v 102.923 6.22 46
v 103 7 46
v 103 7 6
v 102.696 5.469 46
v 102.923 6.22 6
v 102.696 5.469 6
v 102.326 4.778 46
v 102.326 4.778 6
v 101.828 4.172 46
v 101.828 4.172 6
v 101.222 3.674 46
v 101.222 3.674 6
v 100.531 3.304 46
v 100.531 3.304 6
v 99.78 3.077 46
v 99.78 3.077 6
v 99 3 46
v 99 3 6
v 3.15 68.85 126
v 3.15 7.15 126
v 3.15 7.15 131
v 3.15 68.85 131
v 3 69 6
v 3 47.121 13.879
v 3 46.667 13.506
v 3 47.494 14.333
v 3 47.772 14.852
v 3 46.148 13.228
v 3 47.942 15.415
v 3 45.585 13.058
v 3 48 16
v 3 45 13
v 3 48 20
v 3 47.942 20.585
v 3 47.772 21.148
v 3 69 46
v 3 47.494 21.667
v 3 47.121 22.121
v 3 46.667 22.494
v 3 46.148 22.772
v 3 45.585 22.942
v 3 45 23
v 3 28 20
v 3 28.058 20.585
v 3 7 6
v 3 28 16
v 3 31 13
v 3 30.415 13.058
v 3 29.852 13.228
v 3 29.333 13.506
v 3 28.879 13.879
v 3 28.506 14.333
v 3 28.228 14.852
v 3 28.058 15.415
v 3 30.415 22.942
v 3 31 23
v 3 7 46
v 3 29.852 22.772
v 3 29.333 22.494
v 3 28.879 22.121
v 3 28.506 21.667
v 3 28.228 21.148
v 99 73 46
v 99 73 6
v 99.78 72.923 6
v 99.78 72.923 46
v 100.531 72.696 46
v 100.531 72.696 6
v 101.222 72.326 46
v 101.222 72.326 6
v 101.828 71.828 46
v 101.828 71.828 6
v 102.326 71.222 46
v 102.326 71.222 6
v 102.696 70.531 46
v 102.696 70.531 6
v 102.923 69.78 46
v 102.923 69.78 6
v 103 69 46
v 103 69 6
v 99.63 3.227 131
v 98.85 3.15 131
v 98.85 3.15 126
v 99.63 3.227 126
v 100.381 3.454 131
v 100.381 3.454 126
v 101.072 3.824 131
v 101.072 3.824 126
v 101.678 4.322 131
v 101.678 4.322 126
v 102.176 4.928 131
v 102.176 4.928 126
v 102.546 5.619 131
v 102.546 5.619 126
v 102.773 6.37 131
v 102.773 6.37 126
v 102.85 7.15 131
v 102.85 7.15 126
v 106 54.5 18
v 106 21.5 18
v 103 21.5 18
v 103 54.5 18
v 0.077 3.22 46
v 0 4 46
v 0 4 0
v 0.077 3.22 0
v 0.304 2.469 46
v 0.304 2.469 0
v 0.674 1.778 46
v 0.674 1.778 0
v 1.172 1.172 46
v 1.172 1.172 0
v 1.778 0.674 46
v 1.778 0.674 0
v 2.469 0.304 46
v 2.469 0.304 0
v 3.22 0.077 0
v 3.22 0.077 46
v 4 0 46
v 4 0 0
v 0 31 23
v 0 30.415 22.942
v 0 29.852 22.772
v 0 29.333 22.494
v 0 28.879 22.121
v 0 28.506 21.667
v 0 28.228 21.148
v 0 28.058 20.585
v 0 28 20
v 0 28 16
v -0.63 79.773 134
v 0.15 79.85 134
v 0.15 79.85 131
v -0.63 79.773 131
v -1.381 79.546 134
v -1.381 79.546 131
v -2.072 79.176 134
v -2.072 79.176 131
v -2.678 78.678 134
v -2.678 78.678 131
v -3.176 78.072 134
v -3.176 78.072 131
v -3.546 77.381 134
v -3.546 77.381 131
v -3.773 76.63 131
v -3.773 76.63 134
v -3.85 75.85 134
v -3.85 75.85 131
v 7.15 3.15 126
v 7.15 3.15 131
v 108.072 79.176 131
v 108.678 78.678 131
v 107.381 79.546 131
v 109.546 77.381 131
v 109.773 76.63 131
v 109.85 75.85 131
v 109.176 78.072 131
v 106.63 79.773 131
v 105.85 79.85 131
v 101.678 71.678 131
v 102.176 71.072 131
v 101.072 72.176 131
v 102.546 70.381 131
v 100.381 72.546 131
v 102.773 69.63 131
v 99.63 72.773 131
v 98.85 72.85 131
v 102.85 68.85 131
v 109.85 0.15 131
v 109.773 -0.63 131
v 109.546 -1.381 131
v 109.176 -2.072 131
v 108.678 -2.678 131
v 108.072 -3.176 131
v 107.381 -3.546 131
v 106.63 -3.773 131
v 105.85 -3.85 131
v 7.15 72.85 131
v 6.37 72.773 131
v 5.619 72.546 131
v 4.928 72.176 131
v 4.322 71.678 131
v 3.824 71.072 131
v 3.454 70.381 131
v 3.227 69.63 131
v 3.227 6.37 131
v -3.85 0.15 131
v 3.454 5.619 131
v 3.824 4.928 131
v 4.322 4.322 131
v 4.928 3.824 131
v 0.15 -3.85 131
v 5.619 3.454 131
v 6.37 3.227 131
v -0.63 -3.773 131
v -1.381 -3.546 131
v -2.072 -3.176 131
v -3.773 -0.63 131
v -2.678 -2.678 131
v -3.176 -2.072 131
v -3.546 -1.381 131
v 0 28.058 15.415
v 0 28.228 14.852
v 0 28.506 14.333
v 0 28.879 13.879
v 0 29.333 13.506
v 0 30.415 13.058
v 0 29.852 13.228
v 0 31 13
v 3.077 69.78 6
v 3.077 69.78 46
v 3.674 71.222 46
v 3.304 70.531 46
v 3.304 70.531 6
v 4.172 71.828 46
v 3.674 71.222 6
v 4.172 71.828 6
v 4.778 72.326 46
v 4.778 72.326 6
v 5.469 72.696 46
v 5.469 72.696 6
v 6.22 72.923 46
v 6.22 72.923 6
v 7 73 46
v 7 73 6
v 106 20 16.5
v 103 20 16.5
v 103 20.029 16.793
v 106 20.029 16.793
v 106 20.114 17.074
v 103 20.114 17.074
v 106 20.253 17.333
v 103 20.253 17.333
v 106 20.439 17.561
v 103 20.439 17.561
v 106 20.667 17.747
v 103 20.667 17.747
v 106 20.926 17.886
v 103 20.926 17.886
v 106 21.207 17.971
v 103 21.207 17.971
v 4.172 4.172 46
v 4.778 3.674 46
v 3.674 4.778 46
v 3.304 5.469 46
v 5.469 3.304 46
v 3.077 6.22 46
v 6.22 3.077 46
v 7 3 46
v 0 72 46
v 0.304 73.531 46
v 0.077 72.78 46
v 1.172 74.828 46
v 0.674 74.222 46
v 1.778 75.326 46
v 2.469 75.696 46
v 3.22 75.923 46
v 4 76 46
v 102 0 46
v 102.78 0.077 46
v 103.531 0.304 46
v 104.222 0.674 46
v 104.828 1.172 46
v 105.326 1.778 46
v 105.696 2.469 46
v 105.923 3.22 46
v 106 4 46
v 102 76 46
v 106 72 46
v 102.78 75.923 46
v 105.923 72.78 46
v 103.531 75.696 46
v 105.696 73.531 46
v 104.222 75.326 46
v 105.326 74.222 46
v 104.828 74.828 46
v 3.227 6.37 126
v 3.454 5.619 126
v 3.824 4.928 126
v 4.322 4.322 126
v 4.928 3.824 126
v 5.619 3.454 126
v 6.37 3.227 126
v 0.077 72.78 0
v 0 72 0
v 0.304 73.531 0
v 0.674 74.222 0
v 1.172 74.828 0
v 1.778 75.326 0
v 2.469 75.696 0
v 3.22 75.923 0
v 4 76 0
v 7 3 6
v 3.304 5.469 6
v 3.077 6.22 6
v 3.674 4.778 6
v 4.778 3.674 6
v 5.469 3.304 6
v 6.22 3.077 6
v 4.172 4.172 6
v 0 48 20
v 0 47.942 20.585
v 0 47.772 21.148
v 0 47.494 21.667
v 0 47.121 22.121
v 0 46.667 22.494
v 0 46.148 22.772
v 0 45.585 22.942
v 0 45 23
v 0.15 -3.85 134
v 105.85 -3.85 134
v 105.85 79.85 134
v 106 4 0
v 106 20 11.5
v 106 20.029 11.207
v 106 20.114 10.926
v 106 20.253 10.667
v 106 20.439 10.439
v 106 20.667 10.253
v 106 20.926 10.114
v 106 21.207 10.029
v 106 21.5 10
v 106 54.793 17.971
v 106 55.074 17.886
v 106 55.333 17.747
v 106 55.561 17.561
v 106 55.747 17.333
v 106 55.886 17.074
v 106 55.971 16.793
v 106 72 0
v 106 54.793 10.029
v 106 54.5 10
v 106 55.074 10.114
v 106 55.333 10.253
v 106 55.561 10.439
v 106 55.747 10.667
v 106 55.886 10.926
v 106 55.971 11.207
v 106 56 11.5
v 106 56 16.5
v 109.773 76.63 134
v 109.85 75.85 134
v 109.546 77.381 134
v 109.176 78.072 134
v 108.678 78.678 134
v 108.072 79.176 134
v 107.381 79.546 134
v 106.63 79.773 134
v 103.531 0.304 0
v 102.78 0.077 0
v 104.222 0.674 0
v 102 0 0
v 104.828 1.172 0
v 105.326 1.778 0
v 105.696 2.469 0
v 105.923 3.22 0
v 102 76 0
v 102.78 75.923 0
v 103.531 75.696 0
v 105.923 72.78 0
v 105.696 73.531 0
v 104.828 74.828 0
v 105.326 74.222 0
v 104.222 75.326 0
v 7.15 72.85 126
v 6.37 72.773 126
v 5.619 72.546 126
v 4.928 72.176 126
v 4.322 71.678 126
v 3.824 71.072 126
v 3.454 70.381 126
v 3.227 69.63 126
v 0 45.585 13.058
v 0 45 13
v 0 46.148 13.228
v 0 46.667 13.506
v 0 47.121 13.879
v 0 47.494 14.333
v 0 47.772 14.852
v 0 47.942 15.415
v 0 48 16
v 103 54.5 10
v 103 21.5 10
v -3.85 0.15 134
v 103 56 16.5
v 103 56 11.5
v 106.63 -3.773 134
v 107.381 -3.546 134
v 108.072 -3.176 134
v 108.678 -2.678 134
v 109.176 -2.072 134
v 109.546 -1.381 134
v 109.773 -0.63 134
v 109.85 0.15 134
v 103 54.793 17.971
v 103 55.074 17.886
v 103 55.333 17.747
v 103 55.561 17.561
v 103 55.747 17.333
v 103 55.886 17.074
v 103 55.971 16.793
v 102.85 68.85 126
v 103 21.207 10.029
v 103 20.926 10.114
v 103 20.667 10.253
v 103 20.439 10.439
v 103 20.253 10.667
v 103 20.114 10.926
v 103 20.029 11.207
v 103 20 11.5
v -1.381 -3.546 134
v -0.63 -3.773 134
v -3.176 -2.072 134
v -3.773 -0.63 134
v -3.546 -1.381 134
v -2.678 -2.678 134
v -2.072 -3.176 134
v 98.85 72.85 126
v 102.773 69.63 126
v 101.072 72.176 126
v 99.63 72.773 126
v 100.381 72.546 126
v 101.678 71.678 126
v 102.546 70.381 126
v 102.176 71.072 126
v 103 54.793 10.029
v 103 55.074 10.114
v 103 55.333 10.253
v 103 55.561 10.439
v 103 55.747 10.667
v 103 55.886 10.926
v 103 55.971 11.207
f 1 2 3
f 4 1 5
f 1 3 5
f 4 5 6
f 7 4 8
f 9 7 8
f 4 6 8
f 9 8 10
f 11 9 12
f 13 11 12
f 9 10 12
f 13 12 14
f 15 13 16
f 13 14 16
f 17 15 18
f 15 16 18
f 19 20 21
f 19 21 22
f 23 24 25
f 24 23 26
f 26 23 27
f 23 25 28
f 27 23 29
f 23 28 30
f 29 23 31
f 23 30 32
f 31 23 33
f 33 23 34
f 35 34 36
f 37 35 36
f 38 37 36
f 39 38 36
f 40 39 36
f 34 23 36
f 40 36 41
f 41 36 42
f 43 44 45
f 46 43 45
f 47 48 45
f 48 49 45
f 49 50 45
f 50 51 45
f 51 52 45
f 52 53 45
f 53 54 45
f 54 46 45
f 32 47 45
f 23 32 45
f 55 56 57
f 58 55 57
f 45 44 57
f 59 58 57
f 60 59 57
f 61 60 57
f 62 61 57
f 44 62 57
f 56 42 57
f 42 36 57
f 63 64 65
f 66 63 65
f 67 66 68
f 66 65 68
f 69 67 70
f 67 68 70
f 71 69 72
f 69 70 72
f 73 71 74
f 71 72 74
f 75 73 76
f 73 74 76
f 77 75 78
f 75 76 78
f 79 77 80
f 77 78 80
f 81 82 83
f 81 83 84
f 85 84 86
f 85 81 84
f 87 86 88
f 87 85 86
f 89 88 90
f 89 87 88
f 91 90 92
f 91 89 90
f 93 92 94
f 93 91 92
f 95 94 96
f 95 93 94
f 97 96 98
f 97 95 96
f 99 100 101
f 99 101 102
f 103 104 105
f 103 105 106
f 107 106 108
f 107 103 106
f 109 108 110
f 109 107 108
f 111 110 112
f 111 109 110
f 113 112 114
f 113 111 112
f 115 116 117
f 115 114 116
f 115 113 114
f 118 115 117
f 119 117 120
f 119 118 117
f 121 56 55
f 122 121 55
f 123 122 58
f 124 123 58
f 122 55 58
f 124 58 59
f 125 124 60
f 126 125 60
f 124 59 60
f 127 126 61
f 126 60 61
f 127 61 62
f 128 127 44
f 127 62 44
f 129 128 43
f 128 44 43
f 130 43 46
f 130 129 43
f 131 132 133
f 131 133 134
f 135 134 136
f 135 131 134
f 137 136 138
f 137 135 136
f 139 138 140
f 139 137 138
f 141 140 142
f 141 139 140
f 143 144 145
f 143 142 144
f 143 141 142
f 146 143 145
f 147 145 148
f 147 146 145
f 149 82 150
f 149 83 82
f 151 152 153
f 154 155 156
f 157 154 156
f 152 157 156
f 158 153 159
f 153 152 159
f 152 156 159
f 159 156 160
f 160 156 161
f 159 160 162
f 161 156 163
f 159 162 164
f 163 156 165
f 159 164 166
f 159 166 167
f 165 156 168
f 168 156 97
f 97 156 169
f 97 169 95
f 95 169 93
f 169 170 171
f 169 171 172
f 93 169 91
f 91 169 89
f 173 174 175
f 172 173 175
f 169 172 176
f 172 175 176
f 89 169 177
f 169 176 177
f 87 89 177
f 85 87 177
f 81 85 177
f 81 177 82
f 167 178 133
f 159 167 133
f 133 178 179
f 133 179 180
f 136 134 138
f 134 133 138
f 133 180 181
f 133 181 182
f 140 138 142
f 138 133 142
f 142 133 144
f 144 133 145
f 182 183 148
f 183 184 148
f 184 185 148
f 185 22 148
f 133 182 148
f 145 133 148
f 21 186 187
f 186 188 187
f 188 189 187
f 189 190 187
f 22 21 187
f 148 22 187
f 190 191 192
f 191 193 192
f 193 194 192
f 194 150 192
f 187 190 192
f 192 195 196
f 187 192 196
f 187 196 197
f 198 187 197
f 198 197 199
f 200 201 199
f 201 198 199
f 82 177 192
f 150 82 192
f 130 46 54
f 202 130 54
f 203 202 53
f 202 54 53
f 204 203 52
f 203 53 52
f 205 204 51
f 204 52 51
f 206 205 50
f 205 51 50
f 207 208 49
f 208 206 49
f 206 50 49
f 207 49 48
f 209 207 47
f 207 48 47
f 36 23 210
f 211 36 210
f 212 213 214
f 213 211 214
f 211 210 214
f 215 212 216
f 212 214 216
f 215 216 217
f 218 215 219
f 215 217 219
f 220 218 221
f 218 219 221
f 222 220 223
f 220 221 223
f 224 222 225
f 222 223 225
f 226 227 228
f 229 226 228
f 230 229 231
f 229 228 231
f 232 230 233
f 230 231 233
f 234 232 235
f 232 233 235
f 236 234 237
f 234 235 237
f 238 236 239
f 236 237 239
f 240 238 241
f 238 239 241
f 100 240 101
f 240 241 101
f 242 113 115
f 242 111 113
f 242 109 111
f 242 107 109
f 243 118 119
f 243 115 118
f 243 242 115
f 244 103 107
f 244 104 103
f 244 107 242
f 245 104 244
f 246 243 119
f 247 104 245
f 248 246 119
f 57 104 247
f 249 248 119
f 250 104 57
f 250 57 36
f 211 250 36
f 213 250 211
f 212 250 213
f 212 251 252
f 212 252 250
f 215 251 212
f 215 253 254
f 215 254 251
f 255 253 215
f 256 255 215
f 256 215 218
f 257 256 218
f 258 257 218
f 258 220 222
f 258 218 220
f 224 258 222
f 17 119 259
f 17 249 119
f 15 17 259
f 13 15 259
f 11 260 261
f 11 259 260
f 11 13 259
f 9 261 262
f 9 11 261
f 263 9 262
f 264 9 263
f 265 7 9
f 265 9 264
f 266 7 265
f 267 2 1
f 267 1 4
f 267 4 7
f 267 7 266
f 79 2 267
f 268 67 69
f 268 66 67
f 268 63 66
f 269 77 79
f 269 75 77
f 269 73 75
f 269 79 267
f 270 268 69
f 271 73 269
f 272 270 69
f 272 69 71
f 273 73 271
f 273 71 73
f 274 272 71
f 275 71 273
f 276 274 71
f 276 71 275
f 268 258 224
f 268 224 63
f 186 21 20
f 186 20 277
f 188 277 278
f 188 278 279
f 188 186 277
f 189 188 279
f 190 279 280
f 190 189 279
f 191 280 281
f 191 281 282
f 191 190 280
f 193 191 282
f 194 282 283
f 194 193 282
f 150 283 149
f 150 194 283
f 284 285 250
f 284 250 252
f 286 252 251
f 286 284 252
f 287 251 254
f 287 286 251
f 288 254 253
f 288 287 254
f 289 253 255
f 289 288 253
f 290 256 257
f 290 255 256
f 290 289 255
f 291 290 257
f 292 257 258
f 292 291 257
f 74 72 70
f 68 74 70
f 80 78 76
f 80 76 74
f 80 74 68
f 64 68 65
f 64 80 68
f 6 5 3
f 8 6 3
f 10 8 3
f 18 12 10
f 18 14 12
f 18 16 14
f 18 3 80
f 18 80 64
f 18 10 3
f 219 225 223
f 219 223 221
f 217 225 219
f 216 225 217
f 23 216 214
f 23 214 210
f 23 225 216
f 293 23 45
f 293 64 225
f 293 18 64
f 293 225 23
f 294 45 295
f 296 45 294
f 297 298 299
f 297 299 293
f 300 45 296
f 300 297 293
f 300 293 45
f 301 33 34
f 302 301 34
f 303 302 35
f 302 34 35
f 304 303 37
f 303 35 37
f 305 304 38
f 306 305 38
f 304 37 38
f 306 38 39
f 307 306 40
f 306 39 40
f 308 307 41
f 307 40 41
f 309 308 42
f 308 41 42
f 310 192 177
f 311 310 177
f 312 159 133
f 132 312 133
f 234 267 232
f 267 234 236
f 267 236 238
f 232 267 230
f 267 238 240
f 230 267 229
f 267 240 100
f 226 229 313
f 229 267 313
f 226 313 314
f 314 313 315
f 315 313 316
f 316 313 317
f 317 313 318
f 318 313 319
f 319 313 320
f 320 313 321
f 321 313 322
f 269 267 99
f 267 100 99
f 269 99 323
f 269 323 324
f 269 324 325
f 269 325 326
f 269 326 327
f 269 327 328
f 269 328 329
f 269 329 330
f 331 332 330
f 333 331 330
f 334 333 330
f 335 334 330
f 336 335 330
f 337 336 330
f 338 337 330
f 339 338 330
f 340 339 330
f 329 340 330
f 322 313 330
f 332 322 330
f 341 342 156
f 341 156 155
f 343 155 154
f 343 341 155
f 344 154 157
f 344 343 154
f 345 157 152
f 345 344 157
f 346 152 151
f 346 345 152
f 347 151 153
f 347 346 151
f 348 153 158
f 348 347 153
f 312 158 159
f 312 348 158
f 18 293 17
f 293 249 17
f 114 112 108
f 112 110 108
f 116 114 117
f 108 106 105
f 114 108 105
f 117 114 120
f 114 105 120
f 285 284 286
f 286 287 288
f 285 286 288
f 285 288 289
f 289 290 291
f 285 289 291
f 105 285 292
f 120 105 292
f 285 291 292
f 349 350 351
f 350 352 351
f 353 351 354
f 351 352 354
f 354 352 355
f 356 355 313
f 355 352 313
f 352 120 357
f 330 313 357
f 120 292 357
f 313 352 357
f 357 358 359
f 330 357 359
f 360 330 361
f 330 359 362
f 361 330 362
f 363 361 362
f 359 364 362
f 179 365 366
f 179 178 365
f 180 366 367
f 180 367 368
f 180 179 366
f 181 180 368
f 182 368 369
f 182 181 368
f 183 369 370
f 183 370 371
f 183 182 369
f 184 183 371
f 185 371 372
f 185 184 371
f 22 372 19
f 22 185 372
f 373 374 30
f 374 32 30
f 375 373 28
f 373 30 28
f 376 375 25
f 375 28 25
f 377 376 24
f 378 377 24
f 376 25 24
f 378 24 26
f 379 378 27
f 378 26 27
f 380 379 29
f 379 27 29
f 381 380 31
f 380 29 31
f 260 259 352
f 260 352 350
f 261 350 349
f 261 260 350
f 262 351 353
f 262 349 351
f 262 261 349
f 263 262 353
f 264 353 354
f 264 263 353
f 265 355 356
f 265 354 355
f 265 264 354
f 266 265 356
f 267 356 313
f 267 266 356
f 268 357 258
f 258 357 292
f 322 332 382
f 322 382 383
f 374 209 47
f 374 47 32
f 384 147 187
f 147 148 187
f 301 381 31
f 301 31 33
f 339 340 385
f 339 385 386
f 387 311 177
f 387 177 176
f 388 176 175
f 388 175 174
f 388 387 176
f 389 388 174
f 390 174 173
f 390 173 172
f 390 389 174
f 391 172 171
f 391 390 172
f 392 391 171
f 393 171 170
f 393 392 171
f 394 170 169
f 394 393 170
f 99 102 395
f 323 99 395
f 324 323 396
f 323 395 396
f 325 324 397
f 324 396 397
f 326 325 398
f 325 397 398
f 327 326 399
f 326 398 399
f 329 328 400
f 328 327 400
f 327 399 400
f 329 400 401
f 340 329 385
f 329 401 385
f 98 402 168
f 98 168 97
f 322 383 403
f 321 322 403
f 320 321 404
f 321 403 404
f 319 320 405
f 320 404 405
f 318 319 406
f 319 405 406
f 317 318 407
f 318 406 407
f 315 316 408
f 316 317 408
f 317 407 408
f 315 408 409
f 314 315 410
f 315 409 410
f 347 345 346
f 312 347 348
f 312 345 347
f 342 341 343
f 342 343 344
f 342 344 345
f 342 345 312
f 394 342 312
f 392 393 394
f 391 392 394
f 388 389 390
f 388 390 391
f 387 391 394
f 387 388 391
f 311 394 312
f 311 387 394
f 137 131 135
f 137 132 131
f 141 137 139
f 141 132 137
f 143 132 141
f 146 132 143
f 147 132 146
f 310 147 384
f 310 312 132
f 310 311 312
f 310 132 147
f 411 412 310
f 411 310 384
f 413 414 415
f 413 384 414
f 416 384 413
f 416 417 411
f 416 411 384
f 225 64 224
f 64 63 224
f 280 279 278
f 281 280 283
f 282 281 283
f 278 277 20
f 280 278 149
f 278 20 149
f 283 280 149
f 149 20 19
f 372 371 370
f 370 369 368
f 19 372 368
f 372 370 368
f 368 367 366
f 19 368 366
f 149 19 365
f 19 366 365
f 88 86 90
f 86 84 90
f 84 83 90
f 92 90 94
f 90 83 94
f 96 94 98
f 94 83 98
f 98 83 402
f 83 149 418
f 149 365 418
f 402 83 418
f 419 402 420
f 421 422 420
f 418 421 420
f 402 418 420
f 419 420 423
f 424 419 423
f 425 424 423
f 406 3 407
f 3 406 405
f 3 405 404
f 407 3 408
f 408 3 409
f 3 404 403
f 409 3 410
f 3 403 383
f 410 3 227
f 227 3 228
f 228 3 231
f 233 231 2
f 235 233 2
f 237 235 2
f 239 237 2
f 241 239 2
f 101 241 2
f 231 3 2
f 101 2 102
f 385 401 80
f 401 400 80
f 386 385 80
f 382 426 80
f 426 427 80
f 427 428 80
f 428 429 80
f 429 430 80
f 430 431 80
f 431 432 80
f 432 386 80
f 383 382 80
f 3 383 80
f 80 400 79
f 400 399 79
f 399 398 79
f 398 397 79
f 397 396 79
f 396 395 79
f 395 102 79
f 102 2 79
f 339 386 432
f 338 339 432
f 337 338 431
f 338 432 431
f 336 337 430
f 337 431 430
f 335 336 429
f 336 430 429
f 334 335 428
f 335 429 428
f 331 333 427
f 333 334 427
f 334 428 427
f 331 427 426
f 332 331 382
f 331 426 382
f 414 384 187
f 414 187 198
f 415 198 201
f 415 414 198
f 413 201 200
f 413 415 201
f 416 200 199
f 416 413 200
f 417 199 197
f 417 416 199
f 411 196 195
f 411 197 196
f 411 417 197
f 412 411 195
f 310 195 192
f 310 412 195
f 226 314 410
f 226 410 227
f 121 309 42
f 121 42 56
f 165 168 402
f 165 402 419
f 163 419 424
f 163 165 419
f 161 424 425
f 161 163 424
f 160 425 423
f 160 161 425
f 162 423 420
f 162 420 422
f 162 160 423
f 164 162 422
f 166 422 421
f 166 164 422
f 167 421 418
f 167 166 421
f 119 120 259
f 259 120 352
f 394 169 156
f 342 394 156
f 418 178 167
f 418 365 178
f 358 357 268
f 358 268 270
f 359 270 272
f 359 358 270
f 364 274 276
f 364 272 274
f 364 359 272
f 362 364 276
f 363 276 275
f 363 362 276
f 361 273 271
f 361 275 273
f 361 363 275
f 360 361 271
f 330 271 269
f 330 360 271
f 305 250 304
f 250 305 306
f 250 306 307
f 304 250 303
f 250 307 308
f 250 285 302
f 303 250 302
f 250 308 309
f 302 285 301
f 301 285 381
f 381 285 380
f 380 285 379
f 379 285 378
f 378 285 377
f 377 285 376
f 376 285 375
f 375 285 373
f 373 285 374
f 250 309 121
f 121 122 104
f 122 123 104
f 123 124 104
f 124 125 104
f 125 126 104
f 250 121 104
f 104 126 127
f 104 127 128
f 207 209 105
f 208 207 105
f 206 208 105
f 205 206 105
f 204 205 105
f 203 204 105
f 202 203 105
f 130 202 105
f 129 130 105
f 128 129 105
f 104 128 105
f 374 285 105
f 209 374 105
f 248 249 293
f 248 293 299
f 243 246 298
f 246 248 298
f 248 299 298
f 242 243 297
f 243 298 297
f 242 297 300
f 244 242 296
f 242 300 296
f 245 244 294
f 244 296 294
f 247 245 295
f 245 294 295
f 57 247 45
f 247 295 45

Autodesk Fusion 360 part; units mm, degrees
sketch "Sketch1" plane through (0, 0, 0) normal (0, 0, 1) x (1, 0, 0)
  line L0 (0, 0) -> (106, 0)
  line L1 (106, 0) -> (106, 76)
  line L2 (106, 76) -> (0, 76)
  line L3 (0, 76) -> (0, 0)
  dimension "d1" = 106
  dimension "d2" = 76
extrude "Extrude1" add sketch "Sketch1" along normal blind 3 makes body 1
extrude "Extrude2" add 1 faces at (35.3333, 50.6667, 3) along direction (0, 0, 1) blind 43 on bodies 1 bodies 1
sketch "Sketch2" plane through (0, 0, 46) normal (0, 0, 1) x (-1, 0, 0)
  line L0 (0, -76) -> (0, 0)
  line L1 (0, 0) -> (-106, 0)
  line L2 (-106, 0) -> (-106, -76)
  line L3 (-106, -76) -> (0, -76)
  line L4 (-3, -73) -> (-3, -3)
  line L5 (-3, -3) -> (-103, -3)
  line L6 (-103, -3) -> (-103, -73)
  line L7 (-103, -73) -> (-3, -73)
  dimension "d7" = -3
extrude "Extrude3" cut sketch "Sketch2" against normal blind 40 contours L4 L5 L6 L7 bodies 1
ref_plane "WorkPlane1" through (53, 38, 126) normal (0, 0, 1) x (1, 0, 0)
sketch "Sketch3" plane through (0, 0, 126) normal (0, 0, 1) x (1, 0, 0)
  line L0 (3, 73) -> (103, 73)
  line L1 (103, 73) -> (103, 3)
  line L2 (103, 3) -> (3, 3)
  line L3 (3, 3) -> (3, 73)
  line L4 (102.85, 3.15) -> (3.15, 3.15)
  line L5 (3.15, 3.15) -> (3.15, 72.85)
  line L6 (3.15, 72.85) -> (102.85, 72.85)
  line L7 (102.85, 72.85) -> (102.85, 3.15)
  point P0 (3, 73)
  point P1 (103, 3)
  dimension "d12" = 0.15
extrude "Extrude4" add sketch "Sketch3" along normal blind 5 separate body contours L4 L5 L6 L7 makes body 2
sketch "Sketch4" plane through (0, 0, 131) normal (0, 0, 1) x (-1, 0, 0)
  line L0 (-102.85, -72.85) -> (-3.15, -72.85)
  line L1 (-3.15, -72.85) -> (-3.15, -3.15)
  line L2 (-3.15, -3.15) -> (-102.85, -3.15)
  line L3 (-102.85, -3.15) -> (-102.85, -72.85)
  line L4 (-109.85, 3.85) -> (-109.85, -79.85)
  line L5 (-109.85, -79.85) -> (3.85, -79.85)
  line L6 (3.85, -79.85) -> (3.85, 3.85)
  line L7 (3.85, 3.85) -> (-109.85, 3.85)
  dimension "d15" = 7
extrude "Extrude5" add sketch "Sketch4" along normal blind 3 contours L0 L1 L2 L3 | L4 L5 L6 L7 bodies 2
sketch "Sketch5" plane through (106, 0, 0) normal (1, 0, 0) x (0, 1, 0)
  line L0 (0, 0) -> (76, 0)
  line L1 (76, 0) -> (76, 46)
  line L2 (76, 46) -> (0, 46)
  line L3 (0, 46) -> (0, 0)
  line L4 (20, 18) -> (56, 18)
  line L5 (56, 18) -> (56, 10)
  line L6 (56, 10) -> (20, 10)
  line L7 (20, 10) -> (20, 18)
  line L8 (38, 10) -> (38, 0)
  dimension "d24" = 8
  dimension "d25" = 36
  dimension "d36" = 10
extrude "Extrude6" cut sketch "Sketch5" against normal blind 19 contours L4 L5 L6 L7 bodies 1
sketch "Sketch6" plane through (0, 0, 0) normal (-1, 0, 0) x (0, -1, 0)
  line L0 (-76, 0) -> (0, 0)
  line L1 (0, 0) -> (0, 46)
  line L2 (0, 46) -> (-76, 46)
  line L3 (-76, 46) -> (-76, 0)
  line L4 (-48, 23) -> (-28, 23)
  line L5 (-28, 23) -> (-28, 13)
  line L6 (-28, 13) -> (-48, 13)
  line L7 (-48, 13) -> (-48, 23)
  line L8 (-38, 13) -> (-38, 0)
  dimension "d20" = 20
  dimension "d21" = 10
  dimension "d29" = 13
extrude "Extrude7" cut sketch "Sketch6" against normal blind 30 contours L4 L5 L6 L7 bodies 1
fillet "Fillet1" radius 3 4 edges at (1.5, 48, 23) (1.5, 28, 23) (1.5, 28, 13) (1.5, 48, 13) on bodies 1
fillet "Fillet2" radius 1.5 4 edges at (104.5, 56, 18) (104.5, 56, 10) (104.5, 20, 10) (104.5, 20, 18) on bodies 1
fillet "Fillet3" radius 4 16 edges at (106, 76, 23) (103, 73, 26) (103, 3, 26) (3, 3, 26) (0, 0, 23) (3, 73, 26) (0, 76, 23) (106, 0, 23) (102.85, 72.85, 128.5) (102.85, 3.15, 128.5) (3.15, 3.15, 128.5) (3.15, 72.85, 128.5) (-3.85, 79.85, 132.5) (109.85, 79.85, 132.5) (109.85, -3.85, 132.5) (-3.85, -3.85, 132.5) on bodies 1 2
